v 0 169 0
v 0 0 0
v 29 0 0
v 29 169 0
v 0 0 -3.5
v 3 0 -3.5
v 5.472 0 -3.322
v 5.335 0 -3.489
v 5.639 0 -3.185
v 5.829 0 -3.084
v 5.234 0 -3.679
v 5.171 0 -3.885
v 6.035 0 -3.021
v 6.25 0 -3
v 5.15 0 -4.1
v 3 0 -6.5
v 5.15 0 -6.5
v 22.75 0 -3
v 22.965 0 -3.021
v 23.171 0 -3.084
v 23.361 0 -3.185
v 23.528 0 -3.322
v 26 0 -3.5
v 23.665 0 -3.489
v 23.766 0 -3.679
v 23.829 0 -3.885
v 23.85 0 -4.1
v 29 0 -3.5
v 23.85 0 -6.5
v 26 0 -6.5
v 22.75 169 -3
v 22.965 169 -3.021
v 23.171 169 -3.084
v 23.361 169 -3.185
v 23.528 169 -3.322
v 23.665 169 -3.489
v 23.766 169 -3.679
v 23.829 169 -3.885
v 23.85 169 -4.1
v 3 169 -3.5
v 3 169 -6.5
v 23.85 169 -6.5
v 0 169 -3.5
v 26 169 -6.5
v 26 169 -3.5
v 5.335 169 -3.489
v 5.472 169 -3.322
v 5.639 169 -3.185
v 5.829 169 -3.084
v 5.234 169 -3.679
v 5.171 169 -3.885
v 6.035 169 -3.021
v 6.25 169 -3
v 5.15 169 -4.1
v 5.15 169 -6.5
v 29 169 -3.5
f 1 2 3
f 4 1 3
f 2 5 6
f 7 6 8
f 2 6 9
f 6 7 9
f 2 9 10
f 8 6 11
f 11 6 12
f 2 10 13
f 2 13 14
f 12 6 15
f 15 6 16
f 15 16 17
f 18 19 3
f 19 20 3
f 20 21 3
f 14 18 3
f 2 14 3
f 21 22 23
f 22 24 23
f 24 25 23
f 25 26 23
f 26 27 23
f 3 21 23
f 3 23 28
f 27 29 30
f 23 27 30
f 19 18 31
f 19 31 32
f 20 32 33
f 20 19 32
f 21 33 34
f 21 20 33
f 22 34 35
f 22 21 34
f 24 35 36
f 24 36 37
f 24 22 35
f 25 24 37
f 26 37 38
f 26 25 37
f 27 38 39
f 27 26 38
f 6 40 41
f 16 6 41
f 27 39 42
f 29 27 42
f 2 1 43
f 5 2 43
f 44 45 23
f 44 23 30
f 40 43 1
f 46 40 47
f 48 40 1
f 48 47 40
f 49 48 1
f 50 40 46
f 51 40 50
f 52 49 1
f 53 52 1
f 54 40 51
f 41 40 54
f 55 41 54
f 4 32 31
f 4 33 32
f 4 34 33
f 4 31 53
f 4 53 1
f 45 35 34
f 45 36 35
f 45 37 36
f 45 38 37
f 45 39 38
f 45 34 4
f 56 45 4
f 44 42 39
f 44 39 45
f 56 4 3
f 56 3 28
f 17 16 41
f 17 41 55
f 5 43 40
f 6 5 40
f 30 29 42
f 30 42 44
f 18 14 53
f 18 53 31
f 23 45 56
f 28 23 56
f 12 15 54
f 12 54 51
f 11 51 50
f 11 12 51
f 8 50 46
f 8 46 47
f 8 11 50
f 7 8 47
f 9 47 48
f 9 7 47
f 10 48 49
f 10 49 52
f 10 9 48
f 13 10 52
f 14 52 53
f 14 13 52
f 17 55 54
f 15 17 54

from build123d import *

# Parameters (mm, degrees)
SKETCH1_W                                  = 29
SKETCH1_H                                  = 6.5
TOP_PIECE_WITH_RIDGES_DEPTH                = 169
SUBTRACT_ACTUATOR_AND_BOTTOM_MOLD_OUTLIN_W = 3
SUBTRACT_ACTUATOR_AND_BOTTOM_MOLD_OUTLIN_H = 3
SUBTRACT_ACTUATOR_AND_BOTTOM_MOLD_DEPTH    = 169


# Read off the part's stored shape, not the designer's step: subtract actuator and bottom mold
with BuildPart() as part:
    # Sketch1 → top piece with ridges (new body)
    with BuildSketch(Plane(origin=(0, 0, 0), x_dir=(1, 0, 0), z_dir=(0, 1, 0))):
        with Locations((14.5, 3.25)):
            Rectangle(SKETCH1_W, SKETCH1_H)
    extrude(amount=TOP_PIECE_WITH_RIDGES_DEPTH)

    # subtract actuator and bottom mold outlin → subtract actuator and bottom mold (cut)
    with BuildSketch(Plane(origin=(0, 0, 0), x_dir=(1, 0, 0), z_dir=(0, 1, 0))):
        with Locations((27.5, 5)):
            Rectangle(SUBTRACT_ACTUATOR_AND_BOTTOM_MOLD_OUTLIN_W, SUBTRACT_ACTUATOR_AND_BOTTOM_MOLD_OUTLIN_H)
        with BuildLine():
            Line((23.85, 6.5), (5.15, 6.5))
            Line((5.15, 6.5), (5.15, 4.1))
            ThreePointArc((5.15, 4.1), (5.472182541, 3.322182541), (6.25, 3))
            Line((6.25, 3), (22.75, 3))
            ThreePointArc((22.75, 3), (23.527817459, 3.322182541), (23.85, 4.1))
            Line((23.85, 4.1), (23.85, 6.5))
        make_face()
        with Locations((1.5, 5)):
            Rectangle(SUBTRACT_ACTUATOR_AND_BOTTOM_MOLD_OUTLIN_W, SUBTRACT_ACTUATOR_AND_BOTTOM_MOLD_OUTLIN_H)
    extrude(amount=SUBTRACT_ACTUATOR_AND_BOTTOM_MOLD_DEPTH, mode=Mode.SUBTRACT)


solid = part.part
